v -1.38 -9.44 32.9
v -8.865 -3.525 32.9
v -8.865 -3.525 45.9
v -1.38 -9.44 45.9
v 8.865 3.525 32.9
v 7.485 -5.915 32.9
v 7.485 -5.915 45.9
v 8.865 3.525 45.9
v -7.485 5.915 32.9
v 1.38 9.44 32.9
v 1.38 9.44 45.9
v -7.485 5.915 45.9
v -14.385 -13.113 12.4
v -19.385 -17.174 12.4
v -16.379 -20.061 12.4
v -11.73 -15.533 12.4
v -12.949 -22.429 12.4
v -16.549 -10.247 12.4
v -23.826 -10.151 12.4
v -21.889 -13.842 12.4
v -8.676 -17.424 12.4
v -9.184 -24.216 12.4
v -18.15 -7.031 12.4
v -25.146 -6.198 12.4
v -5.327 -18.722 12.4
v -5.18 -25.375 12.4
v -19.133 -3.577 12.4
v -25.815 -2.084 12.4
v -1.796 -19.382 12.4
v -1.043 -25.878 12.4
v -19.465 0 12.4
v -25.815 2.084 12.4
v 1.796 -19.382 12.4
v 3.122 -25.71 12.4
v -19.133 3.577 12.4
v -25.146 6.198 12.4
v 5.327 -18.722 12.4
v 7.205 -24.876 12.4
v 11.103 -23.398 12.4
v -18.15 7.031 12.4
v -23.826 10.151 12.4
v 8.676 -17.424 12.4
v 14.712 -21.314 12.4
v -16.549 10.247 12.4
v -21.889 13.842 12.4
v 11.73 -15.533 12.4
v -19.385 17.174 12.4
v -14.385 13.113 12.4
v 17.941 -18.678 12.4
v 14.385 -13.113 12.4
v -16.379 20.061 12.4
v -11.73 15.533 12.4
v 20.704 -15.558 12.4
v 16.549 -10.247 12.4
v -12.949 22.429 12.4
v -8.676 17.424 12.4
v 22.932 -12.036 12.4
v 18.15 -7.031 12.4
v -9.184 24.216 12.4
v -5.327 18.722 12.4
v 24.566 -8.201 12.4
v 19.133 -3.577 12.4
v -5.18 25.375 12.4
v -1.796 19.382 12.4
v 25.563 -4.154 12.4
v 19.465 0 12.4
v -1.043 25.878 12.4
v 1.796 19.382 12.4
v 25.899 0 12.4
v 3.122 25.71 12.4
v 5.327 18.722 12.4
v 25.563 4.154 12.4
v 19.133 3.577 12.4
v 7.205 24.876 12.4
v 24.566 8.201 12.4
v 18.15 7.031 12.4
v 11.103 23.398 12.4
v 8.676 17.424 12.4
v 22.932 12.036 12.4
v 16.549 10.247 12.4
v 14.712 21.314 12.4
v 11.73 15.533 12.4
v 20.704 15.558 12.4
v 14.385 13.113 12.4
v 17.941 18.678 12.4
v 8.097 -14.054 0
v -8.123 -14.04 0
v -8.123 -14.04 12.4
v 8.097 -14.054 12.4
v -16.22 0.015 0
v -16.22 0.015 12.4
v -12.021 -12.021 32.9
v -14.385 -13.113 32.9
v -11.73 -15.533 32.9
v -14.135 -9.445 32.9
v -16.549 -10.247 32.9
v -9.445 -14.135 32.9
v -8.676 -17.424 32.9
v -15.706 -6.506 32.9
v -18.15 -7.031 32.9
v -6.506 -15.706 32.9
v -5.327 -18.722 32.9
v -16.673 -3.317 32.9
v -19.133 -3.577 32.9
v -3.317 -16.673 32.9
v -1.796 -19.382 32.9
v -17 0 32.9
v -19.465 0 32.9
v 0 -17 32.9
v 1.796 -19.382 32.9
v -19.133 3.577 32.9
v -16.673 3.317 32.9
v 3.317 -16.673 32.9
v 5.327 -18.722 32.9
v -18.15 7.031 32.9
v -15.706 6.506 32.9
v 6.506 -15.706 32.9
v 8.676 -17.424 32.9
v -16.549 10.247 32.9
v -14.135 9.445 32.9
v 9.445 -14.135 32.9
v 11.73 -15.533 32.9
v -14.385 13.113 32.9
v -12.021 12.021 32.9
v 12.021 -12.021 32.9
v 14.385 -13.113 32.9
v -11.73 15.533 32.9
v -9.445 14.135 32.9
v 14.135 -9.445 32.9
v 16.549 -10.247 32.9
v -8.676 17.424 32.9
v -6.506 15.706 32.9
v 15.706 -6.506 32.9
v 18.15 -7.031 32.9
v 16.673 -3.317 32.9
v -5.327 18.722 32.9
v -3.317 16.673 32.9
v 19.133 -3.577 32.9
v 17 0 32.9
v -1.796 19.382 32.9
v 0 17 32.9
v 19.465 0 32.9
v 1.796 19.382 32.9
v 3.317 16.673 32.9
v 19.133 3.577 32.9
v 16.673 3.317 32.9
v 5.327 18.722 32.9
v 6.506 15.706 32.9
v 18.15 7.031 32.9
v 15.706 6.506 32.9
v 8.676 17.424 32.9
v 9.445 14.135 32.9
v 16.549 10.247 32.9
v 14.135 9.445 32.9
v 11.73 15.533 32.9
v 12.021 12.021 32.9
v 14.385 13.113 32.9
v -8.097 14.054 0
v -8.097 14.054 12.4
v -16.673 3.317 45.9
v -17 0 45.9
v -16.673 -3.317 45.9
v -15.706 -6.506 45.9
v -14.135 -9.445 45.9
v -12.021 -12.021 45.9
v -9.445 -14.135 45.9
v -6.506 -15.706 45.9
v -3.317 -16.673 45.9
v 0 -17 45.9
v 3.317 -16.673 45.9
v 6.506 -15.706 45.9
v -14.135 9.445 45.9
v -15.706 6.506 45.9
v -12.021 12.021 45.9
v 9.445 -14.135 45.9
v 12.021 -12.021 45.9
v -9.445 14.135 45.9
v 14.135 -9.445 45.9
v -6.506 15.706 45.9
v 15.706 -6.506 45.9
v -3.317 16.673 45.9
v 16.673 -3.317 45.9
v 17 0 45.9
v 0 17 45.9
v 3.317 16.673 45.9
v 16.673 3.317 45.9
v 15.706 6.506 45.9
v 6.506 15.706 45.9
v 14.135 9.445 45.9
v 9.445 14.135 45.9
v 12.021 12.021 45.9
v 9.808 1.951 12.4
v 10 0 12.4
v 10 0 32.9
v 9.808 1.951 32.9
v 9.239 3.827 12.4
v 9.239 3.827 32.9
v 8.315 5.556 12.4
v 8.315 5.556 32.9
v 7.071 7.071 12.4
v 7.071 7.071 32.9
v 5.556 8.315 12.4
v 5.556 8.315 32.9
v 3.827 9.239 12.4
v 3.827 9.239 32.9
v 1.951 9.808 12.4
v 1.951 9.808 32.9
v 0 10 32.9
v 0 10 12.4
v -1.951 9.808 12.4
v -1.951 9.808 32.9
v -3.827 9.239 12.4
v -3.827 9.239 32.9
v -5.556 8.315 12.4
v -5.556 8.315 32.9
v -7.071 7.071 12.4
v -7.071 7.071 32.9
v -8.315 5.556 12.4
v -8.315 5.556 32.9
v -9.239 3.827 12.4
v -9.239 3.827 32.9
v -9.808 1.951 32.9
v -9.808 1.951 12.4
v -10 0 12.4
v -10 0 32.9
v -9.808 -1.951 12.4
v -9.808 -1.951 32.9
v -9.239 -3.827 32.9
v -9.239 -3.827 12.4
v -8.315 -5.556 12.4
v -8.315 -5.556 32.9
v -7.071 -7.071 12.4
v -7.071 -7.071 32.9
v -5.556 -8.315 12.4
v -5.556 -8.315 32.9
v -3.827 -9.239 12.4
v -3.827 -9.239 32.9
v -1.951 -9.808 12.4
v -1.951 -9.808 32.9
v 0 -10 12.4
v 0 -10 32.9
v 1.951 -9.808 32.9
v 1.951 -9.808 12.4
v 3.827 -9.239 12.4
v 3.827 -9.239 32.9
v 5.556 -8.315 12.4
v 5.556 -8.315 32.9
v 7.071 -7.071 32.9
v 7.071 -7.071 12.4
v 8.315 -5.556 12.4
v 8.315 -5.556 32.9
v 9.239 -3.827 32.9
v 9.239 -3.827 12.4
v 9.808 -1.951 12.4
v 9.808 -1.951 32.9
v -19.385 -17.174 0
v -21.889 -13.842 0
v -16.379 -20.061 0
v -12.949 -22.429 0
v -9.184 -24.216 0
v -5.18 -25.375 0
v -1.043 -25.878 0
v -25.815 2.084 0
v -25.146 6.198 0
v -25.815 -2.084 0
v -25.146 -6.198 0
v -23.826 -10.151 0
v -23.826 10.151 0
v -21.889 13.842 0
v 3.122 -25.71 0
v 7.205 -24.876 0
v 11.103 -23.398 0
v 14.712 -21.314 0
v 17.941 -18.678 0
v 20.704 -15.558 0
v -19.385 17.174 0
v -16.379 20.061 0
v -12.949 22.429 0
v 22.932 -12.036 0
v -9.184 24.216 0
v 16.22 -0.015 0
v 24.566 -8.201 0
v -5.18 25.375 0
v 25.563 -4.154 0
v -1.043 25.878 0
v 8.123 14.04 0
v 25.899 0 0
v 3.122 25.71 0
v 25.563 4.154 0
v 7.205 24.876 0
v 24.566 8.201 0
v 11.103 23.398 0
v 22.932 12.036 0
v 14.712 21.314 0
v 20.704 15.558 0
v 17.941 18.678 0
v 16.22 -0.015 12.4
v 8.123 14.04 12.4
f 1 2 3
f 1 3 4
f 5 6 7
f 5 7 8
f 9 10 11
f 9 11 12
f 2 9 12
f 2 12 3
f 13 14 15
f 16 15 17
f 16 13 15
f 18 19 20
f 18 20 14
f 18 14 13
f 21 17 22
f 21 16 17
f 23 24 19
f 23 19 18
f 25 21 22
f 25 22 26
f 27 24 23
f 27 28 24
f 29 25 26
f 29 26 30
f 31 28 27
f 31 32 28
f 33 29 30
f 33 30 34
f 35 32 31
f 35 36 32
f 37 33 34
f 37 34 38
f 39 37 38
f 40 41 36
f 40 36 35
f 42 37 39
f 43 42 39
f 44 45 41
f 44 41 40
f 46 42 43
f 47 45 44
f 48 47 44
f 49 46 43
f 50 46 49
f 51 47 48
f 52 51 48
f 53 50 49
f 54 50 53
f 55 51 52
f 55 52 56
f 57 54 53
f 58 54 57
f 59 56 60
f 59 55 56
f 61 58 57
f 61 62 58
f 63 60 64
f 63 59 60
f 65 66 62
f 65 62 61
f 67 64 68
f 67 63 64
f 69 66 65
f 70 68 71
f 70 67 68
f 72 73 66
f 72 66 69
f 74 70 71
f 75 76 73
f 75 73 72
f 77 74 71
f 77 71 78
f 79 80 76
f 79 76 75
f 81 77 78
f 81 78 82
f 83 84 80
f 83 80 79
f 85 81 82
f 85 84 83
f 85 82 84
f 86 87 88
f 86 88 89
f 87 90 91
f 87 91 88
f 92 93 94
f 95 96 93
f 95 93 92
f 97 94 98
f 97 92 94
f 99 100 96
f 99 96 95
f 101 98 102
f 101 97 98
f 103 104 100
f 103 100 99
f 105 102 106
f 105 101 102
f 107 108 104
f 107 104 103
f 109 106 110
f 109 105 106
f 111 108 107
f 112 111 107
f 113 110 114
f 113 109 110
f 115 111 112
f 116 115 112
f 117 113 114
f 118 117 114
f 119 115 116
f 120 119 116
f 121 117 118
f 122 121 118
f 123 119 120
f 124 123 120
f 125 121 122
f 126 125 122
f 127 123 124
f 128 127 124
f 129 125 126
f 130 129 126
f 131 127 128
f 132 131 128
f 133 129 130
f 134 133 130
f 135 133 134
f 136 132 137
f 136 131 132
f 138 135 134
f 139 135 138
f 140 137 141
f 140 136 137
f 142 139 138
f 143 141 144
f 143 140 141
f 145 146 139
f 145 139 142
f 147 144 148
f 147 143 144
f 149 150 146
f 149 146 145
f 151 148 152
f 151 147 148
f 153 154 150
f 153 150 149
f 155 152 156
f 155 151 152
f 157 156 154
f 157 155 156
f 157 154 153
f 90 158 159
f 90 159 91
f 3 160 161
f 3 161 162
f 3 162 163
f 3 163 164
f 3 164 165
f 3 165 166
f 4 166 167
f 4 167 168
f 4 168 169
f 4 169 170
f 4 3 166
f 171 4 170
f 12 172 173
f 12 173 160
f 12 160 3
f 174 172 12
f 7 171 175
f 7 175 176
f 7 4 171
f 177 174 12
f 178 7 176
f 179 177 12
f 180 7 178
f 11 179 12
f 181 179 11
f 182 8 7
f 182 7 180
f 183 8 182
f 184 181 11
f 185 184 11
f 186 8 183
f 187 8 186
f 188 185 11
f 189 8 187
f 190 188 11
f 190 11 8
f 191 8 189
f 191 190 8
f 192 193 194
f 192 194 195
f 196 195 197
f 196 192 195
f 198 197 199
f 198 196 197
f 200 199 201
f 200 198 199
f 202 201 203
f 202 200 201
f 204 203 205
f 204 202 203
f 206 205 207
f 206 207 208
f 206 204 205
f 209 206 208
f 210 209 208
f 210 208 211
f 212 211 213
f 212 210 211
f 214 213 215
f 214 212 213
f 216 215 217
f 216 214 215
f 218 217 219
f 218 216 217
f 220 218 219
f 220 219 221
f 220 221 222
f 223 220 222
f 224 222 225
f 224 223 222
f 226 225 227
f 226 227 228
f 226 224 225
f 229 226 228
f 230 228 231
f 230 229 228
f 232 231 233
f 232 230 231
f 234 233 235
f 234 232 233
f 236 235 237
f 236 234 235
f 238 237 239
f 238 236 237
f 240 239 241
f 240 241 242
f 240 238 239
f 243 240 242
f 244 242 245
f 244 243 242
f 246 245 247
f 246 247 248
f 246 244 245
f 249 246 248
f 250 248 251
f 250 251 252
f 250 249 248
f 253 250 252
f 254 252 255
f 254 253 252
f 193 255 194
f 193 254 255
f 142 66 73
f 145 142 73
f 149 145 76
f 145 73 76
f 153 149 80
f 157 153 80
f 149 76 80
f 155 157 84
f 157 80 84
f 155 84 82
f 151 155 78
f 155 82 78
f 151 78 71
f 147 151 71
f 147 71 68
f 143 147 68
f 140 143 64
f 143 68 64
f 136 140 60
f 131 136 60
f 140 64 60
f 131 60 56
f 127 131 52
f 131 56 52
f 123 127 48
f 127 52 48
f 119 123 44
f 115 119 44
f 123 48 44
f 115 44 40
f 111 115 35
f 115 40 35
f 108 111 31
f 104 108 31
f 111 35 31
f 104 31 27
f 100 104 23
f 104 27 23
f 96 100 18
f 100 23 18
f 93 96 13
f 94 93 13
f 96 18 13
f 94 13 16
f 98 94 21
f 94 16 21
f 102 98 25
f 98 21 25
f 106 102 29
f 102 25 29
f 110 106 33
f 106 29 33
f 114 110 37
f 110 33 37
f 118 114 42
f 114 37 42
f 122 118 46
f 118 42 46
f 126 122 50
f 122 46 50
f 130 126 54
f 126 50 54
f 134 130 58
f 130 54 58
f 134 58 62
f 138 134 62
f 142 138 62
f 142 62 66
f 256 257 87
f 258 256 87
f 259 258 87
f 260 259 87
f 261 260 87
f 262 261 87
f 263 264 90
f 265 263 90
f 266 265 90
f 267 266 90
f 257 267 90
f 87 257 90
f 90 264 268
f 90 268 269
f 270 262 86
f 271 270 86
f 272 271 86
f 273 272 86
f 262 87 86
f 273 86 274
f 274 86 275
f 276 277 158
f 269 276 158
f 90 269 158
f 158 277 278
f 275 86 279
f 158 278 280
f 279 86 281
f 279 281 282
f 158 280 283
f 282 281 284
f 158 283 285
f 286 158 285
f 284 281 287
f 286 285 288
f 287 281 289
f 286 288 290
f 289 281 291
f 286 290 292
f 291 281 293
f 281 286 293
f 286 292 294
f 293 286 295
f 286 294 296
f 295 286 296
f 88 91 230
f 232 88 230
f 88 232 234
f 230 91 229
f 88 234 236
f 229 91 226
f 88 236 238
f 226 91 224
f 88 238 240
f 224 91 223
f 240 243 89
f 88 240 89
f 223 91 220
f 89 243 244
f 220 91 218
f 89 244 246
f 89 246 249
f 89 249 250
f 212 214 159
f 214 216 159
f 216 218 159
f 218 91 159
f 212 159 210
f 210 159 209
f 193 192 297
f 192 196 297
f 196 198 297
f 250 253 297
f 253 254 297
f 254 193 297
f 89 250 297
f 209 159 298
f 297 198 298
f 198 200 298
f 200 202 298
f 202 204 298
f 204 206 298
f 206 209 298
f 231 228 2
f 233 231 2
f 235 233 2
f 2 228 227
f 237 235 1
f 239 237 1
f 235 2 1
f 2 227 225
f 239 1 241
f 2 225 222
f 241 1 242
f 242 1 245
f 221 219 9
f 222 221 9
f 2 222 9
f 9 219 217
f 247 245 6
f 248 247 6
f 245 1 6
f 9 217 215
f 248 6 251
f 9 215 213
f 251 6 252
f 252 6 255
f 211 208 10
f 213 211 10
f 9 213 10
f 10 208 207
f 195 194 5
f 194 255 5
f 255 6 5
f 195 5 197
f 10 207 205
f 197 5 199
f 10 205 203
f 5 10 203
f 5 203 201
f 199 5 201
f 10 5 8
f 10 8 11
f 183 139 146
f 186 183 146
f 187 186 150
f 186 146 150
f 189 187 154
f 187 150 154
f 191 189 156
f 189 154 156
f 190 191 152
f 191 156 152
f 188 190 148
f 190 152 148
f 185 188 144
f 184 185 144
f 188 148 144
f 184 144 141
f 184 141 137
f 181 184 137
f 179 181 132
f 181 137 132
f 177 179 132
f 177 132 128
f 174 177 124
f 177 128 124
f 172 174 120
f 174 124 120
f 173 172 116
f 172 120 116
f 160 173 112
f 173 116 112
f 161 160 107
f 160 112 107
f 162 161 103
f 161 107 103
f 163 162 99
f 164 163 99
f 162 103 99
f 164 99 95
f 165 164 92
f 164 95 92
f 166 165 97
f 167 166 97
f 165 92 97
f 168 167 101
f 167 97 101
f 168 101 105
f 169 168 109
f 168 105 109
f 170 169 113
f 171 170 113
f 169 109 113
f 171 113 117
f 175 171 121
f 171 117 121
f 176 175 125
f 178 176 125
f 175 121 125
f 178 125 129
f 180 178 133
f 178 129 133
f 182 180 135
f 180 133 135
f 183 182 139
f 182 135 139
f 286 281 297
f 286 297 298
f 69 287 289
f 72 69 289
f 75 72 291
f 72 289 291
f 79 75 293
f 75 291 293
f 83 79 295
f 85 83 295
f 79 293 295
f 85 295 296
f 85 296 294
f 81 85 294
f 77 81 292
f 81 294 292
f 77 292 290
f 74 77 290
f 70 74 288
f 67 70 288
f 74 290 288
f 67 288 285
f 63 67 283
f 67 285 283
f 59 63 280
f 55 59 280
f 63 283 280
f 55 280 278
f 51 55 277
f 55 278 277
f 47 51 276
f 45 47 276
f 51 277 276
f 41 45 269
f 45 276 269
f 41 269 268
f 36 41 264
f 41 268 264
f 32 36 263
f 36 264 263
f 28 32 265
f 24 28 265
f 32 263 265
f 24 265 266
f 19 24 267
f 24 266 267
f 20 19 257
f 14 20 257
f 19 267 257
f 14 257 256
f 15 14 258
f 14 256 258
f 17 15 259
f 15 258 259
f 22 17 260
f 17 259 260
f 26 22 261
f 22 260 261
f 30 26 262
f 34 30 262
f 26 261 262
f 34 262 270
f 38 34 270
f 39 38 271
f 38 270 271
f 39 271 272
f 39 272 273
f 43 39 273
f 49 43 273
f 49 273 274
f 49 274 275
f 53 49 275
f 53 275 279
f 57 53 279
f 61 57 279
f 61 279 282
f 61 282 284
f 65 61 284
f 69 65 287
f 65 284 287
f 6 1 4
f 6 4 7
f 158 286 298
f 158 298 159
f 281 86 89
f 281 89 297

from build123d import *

# Parameters (mm, degrees)
SKETCH_R      = 25.898575
PAD_DEPTH     = 12.4
SKETCH001_R   = 19.464616
SKETCH001_R_2 = 10
PAD001_DEPTH  = 20.5
SKETCH002_R   = 17
PAD002_DEPTH  = 13


with BuildPart() as part:
    # Sketch → Pad (new body)
    with BuildSketch(Plane.XY):
        Circle(SKETCH_R)
        Polygon((8.12282, 14.039523), (-8.097173, 14.05433), (-16.219993, 0.014807), (-8.12282, -14.039523), (8.097173, -14.05433), (16.219993, -0.014807), align=None, mode=Mode.SUBTRACT)
    extrude(amount=PAD_DEPTH)

    # Sketch001 (on Face9 of Pad) → Pad001 (join)
    with BuildSketch(Plane.XY.offset(12.4)):
        Circle(SKETCH001_R)
        Circle(SKETCH001_R_2, mode=Mode.SUBTRACT)
    extrude(amount=PAD001_DEPTH)

    # Sketch002 (on Face12 of Pad001) → Pad002 (join)
    with BuildSketch(Plane.XY.offset(32.9)):
        Circle(SKETCH002_R)
        Polygon((-7.484853, 5.915115), (-8.865066, -3.524515), (-1.380213, -9.43963), (7.484853, -5.915115), (8.865066, 3.524515), (1.380213, 9.43963), align=None, mode=Mode.SUBTRACT)
    extrude(amount=PAD002_DEPTH)


solid = part.part
